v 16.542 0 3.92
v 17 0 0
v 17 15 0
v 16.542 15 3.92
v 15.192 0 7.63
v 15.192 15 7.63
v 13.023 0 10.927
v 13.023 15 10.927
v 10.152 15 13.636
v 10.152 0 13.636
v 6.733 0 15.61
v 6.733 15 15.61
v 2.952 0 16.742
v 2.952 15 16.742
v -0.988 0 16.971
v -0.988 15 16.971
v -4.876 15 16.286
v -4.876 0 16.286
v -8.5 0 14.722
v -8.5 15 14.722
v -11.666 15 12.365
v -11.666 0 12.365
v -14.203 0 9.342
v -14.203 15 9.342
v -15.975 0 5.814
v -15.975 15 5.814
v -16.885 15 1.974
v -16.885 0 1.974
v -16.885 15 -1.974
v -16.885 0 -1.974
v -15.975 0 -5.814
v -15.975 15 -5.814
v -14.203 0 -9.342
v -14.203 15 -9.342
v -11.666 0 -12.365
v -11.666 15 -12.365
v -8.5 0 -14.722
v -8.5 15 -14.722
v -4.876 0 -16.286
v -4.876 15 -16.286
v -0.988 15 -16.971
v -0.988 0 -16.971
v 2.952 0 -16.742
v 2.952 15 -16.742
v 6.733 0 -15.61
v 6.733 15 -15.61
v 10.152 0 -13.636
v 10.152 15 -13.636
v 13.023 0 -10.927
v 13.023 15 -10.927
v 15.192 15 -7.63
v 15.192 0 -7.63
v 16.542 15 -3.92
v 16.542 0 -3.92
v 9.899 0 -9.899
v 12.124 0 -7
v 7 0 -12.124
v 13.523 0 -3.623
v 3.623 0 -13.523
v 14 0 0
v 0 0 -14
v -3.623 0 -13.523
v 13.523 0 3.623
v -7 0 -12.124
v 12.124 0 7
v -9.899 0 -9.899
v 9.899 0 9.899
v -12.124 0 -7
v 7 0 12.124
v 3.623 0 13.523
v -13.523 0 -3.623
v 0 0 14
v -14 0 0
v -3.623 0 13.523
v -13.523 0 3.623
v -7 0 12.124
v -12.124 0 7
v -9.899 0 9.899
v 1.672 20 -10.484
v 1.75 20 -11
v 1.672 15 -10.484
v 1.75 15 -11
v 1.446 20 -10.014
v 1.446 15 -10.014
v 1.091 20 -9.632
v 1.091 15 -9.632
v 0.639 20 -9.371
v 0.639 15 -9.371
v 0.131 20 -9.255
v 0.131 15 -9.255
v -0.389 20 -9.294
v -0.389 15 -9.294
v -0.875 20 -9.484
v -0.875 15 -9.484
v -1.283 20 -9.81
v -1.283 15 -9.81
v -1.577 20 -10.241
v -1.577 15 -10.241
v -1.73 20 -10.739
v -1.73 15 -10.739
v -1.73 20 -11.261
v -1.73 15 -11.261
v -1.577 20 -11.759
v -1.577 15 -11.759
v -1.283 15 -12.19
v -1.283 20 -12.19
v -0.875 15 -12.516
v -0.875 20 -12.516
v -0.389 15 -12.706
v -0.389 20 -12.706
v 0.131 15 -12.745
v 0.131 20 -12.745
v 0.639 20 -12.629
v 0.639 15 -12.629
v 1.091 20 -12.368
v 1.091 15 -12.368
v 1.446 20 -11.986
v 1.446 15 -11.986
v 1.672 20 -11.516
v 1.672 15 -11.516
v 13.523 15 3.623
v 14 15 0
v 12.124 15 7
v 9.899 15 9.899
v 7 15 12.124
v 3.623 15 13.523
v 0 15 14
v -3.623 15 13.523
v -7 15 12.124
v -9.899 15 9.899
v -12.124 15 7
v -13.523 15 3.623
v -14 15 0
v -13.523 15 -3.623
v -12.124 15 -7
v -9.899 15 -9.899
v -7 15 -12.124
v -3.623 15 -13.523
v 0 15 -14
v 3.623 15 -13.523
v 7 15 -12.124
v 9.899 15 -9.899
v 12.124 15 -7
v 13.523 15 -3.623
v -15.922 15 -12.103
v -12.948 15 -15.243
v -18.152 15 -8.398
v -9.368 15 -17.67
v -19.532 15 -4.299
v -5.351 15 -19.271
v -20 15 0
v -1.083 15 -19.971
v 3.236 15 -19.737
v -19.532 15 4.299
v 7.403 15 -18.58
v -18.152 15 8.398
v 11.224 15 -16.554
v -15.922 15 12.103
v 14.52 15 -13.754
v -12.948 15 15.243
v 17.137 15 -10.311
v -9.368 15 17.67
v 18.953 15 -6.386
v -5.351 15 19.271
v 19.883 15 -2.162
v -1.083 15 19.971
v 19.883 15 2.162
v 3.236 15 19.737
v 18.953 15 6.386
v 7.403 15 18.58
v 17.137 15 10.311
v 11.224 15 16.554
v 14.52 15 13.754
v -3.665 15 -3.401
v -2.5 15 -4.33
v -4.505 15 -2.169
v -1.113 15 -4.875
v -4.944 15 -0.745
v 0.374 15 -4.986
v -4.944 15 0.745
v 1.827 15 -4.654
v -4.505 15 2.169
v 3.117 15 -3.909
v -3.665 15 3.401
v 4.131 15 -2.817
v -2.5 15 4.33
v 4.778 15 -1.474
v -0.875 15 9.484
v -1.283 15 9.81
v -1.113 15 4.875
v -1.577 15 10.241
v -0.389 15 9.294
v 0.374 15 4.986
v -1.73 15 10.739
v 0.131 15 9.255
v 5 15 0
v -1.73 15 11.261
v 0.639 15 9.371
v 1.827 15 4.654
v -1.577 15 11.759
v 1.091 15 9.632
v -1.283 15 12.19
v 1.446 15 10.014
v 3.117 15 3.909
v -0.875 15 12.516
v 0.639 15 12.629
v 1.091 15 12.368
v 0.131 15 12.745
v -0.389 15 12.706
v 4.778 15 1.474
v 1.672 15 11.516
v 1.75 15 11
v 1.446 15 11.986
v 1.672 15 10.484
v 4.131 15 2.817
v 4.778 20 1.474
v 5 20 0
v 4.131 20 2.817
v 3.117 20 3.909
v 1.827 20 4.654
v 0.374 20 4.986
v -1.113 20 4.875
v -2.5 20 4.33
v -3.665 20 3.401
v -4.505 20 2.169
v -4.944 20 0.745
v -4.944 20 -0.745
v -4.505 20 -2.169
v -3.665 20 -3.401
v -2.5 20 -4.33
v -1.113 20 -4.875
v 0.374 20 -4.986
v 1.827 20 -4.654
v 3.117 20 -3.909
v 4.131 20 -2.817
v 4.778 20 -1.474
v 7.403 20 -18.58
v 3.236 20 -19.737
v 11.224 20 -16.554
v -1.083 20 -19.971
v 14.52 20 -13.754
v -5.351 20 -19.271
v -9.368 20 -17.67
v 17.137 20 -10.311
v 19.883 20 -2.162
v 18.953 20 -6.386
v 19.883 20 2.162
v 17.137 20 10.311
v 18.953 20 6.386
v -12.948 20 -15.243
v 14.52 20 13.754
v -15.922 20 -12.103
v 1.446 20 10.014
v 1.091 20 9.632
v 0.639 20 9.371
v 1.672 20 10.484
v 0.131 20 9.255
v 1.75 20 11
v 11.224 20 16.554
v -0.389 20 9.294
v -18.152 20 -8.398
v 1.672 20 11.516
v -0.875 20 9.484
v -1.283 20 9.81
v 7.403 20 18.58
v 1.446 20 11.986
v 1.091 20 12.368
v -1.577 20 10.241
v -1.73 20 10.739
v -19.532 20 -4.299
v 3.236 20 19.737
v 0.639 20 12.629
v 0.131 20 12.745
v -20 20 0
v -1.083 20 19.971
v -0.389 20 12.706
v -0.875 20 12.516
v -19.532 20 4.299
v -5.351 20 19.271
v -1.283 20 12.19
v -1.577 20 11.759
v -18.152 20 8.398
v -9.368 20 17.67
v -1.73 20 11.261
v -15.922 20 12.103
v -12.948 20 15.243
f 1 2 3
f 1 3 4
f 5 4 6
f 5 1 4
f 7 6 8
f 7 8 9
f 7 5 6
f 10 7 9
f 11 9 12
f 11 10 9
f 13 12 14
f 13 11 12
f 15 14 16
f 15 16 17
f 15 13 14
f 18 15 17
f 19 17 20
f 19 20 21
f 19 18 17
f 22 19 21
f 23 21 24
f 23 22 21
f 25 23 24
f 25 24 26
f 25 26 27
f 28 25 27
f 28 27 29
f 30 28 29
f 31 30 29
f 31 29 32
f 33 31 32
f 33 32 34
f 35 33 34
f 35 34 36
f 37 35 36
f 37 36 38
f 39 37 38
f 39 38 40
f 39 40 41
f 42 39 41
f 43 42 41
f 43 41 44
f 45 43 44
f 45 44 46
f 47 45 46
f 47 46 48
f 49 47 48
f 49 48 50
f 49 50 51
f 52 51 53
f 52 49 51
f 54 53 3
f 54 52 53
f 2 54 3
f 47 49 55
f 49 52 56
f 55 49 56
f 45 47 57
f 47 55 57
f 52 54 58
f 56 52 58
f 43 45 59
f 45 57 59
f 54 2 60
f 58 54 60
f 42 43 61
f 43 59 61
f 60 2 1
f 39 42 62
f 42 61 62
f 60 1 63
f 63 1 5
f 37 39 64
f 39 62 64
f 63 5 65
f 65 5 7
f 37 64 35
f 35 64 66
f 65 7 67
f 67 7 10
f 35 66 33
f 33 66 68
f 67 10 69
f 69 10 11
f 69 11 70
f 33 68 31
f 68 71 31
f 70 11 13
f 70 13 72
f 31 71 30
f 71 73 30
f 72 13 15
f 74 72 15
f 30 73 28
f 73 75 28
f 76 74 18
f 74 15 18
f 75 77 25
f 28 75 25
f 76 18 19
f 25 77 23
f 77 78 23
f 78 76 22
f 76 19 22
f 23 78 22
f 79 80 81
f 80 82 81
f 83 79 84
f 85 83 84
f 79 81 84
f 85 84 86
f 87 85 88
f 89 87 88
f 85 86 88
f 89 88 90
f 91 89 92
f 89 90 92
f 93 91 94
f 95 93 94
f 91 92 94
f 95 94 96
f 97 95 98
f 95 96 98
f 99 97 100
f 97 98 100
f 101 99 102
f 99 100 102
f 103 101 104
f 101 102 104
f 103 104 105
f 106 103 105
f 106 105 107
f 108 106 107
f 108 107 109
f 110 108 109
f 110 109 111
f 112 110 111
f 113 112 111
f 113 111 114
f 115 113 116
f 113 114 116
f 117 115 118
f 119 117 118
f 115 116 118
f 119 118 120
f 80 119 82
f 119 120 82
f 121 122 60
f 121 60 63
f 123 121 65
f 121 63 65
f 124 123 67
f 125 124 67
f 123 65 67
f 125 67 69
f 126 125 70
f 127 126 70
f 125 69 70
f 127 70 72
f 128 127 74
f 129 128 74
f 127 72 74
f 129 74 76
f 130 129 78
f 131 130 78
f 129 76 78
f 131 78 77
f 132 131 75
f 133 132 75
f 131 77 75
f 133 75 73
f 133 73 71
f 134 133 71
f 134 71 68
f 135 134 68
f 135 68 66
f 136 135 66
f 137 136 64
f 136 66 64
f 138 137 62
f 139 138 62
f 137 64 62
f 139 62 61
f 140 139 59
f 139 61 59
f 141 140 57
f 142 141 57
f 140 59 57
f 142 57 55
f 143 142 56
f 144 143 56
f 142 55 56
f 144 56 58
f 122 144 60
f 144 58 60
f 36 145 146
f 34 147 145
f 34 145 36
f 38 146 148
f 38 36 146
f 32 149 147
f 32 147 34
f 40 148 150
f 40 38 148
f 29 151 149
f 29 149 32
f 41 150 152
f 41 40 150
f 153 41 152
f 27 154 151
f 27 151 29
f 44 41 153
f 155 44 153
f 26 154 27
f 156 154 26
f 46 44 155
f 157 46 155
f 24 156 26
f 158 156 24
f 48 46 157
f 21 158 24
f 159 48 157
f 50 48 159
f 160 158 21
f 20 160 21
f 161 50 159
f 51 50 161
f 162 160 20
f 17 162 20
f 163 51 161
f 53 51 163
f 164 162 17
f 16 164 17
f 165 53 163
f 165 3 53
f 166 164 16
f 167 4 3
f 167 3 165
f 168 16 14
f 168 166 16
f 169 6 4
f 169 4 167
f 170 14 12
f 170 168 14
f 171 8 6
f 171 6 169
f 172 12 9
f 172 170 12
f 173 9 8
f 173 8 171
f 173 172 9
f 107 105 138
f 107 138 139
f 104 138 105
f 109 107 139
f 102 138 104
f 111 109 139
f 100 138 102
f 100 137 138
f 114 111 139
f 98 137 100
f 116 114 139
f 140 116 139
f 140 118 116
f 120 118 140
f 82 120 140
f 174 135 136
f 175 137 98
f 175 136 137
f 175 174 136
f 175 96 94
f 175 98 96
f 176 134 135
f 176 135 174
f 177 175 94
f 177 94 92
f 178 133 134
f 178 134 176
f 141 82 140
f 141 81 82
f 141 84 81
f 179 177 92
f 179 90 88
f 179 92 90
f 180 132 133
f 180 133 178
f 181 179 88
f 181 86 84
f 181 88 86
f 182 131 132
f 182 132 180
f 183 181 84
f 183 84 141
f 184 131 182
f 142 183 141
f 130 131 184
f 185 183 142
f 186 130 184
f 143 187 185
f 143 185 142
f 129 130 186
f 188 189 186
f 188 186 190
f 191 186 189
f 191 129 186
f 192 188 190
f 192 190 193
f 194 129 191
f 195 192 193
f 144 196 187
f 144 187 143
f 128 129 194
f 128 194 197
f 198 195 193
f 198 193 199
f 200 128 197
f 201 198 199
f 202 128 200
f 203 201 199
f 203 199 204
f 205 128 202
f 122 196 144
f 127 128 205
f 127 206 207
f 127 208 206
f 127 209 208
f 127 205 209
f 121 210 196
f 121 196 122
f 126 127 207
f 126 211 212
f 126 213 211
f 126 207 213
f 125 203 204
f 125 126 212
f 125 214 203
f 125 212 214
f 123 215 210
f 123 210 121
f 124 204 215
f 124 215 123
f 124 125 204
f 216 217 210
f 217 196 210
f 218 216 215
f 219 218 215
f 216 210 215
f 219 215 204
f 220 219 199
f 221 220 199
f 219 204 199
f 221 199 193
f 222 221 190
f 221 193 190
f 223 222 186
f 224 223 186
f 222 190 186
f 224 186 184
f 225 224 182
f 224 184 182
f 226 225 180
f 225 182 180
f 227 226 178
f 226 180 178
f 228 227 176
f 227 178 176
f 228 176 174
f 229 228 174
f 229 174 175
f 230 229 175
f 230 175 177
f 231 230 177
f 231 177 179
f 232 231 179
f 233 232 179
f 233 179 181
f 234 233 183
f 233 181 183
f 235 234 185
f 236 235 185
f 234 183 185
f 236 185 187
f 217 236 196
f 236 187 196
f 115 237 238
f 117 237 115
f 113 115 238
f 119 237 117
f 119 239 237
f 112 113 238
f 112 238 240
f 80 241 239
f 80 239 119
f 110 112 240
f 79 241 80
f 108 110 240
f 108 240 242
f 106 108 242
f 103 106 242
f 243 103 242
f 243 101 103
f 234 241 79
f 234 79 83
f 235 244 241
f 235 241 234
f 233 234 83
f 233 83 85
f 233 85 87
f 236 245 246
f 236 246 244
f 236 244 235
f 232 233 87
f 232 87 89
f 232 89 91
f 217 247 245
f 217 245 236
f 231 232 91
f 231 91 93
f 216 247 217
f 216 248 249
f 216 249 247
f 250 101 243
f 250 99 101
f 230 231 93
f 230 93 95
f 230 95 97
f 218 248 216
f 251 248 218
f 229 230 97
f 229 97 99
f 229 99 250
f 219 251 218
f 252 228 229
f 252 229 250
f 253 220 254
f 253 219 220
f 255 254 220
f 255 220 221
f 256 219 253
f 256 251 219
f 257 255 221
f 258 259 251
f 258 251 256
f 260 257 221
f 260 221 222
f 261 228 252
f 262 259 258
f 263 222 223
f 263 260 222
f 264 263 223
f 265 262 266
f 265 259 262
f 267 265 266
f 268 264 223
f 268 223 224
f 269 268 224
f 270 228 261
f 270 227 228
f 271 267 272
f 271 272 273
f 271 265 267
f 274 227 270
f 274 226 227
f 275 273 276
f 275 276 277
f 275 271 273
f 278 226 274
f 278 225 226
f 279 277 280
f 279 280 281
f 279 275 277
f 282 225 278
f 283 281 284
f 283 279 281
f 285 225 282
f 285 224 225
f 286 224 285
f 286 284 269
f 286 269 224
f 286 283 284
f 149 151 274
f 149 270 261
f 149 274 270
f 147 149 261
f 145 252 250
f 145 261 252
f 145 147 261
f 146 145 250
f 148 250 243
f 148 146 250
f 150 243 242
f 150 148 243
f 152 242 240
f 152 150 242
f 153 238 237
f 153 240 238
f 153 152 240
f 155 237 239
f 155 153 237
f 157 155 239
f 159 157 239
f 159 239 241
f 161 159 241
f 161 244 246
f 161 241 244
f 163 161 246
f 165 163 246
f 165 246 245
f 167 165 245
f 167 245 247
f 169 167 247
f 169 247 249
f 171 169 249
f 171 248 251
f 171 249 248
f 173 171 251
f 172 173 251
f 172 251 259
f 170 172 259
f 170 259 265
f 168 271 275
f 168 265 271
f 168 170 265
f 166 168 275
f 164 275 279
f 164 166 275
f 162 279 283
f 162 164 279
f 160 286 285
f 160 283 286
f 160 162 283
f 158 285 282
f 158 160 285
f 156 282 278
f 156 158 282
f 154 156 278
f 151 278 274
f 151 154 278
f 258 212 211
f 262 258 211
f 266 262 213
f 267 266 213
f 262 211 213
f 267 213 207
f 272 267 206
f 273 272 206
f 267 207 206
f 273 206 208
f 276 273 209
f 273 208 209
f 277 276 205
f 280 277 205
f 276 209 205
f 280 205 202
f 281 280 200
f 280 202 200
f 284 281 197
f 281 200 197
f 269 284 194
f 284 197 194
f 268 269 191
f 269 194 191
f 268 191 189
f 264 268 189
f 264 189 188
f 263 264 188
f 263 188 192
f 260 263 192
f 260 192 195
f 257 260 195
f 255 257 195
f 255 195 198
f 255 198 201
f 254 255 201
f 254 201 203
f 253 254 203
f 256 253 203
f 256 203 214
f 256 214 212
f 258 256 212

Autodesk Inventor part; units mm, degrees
ref_plane "YZ Plane" through (0, 0, 0) normal (1, 0, 0) x (0, 1, 0)
ref_plane "XZ Plane" through (0, 0, 0) normal (0, 1, 0) x (-1, 0, 0)
ref_plane "XY Plane" through (0, 0, 0) normal (0, 0, 1) x (1, 0, 0)
sketch "Esquisse1" plane through (0, 0, 0) normal (0, 1, 0) x (-1, 0, 0)
  circle A0 centre (0, 0) radius 20
  dimension "d0" = 40
extrude "Extrusion1" add sketch "Esquisse1" along normal blind 20
sketch "Esquisse2" plane through (0, 0, 0) normal (0, -1, 0) x (1, 0, 0)
  circle A0 centre (0, 0) radius 20 projected
  circle A1 centre (0, 0) radius 17
  dimension "d3" = 3
extrude "Extrusion2" cut sketch "Esquisse2" against normal blind 15
sketch "Esquisse3" plane through (0, 0, 0) normal (0, -1, 0) x (1, 0, 0)
  circle A0 centre (0, 0) radius 17 projected
  circle A1 centre (0, 0) radius 14
  dimension "d6" = 3
extrude "Extrusion3" cut sketch "Esquisse3" against normal blind 15 contours A1
sketch "Esquisse4" plane through (0, 15, 0) normal (0, -1, 0) x (1, 0, 0)
  circle A0 centre (0, 0) radius 14 projected
  circle A1 centre (0, 0) radius 5
  circle A2 centre (0, 11) radius 1.75
  circle A3 centre (0, -11) radius 1.75
  dimension "d9" = 10
  dimension "d10" = 3.5
  dimension "d11" = 3.5
  dimension "d12" = 11
  dimension "d13" = 11
extrude "Extrusion4" cut sketch "Esquisse4" against normal through all contours A1 | A2 | A3
equation "\"d11\" = d10"
equation "\"d13\" = d12"
properties part number "Bouchon PVC" material "PVC, non plastifié"
